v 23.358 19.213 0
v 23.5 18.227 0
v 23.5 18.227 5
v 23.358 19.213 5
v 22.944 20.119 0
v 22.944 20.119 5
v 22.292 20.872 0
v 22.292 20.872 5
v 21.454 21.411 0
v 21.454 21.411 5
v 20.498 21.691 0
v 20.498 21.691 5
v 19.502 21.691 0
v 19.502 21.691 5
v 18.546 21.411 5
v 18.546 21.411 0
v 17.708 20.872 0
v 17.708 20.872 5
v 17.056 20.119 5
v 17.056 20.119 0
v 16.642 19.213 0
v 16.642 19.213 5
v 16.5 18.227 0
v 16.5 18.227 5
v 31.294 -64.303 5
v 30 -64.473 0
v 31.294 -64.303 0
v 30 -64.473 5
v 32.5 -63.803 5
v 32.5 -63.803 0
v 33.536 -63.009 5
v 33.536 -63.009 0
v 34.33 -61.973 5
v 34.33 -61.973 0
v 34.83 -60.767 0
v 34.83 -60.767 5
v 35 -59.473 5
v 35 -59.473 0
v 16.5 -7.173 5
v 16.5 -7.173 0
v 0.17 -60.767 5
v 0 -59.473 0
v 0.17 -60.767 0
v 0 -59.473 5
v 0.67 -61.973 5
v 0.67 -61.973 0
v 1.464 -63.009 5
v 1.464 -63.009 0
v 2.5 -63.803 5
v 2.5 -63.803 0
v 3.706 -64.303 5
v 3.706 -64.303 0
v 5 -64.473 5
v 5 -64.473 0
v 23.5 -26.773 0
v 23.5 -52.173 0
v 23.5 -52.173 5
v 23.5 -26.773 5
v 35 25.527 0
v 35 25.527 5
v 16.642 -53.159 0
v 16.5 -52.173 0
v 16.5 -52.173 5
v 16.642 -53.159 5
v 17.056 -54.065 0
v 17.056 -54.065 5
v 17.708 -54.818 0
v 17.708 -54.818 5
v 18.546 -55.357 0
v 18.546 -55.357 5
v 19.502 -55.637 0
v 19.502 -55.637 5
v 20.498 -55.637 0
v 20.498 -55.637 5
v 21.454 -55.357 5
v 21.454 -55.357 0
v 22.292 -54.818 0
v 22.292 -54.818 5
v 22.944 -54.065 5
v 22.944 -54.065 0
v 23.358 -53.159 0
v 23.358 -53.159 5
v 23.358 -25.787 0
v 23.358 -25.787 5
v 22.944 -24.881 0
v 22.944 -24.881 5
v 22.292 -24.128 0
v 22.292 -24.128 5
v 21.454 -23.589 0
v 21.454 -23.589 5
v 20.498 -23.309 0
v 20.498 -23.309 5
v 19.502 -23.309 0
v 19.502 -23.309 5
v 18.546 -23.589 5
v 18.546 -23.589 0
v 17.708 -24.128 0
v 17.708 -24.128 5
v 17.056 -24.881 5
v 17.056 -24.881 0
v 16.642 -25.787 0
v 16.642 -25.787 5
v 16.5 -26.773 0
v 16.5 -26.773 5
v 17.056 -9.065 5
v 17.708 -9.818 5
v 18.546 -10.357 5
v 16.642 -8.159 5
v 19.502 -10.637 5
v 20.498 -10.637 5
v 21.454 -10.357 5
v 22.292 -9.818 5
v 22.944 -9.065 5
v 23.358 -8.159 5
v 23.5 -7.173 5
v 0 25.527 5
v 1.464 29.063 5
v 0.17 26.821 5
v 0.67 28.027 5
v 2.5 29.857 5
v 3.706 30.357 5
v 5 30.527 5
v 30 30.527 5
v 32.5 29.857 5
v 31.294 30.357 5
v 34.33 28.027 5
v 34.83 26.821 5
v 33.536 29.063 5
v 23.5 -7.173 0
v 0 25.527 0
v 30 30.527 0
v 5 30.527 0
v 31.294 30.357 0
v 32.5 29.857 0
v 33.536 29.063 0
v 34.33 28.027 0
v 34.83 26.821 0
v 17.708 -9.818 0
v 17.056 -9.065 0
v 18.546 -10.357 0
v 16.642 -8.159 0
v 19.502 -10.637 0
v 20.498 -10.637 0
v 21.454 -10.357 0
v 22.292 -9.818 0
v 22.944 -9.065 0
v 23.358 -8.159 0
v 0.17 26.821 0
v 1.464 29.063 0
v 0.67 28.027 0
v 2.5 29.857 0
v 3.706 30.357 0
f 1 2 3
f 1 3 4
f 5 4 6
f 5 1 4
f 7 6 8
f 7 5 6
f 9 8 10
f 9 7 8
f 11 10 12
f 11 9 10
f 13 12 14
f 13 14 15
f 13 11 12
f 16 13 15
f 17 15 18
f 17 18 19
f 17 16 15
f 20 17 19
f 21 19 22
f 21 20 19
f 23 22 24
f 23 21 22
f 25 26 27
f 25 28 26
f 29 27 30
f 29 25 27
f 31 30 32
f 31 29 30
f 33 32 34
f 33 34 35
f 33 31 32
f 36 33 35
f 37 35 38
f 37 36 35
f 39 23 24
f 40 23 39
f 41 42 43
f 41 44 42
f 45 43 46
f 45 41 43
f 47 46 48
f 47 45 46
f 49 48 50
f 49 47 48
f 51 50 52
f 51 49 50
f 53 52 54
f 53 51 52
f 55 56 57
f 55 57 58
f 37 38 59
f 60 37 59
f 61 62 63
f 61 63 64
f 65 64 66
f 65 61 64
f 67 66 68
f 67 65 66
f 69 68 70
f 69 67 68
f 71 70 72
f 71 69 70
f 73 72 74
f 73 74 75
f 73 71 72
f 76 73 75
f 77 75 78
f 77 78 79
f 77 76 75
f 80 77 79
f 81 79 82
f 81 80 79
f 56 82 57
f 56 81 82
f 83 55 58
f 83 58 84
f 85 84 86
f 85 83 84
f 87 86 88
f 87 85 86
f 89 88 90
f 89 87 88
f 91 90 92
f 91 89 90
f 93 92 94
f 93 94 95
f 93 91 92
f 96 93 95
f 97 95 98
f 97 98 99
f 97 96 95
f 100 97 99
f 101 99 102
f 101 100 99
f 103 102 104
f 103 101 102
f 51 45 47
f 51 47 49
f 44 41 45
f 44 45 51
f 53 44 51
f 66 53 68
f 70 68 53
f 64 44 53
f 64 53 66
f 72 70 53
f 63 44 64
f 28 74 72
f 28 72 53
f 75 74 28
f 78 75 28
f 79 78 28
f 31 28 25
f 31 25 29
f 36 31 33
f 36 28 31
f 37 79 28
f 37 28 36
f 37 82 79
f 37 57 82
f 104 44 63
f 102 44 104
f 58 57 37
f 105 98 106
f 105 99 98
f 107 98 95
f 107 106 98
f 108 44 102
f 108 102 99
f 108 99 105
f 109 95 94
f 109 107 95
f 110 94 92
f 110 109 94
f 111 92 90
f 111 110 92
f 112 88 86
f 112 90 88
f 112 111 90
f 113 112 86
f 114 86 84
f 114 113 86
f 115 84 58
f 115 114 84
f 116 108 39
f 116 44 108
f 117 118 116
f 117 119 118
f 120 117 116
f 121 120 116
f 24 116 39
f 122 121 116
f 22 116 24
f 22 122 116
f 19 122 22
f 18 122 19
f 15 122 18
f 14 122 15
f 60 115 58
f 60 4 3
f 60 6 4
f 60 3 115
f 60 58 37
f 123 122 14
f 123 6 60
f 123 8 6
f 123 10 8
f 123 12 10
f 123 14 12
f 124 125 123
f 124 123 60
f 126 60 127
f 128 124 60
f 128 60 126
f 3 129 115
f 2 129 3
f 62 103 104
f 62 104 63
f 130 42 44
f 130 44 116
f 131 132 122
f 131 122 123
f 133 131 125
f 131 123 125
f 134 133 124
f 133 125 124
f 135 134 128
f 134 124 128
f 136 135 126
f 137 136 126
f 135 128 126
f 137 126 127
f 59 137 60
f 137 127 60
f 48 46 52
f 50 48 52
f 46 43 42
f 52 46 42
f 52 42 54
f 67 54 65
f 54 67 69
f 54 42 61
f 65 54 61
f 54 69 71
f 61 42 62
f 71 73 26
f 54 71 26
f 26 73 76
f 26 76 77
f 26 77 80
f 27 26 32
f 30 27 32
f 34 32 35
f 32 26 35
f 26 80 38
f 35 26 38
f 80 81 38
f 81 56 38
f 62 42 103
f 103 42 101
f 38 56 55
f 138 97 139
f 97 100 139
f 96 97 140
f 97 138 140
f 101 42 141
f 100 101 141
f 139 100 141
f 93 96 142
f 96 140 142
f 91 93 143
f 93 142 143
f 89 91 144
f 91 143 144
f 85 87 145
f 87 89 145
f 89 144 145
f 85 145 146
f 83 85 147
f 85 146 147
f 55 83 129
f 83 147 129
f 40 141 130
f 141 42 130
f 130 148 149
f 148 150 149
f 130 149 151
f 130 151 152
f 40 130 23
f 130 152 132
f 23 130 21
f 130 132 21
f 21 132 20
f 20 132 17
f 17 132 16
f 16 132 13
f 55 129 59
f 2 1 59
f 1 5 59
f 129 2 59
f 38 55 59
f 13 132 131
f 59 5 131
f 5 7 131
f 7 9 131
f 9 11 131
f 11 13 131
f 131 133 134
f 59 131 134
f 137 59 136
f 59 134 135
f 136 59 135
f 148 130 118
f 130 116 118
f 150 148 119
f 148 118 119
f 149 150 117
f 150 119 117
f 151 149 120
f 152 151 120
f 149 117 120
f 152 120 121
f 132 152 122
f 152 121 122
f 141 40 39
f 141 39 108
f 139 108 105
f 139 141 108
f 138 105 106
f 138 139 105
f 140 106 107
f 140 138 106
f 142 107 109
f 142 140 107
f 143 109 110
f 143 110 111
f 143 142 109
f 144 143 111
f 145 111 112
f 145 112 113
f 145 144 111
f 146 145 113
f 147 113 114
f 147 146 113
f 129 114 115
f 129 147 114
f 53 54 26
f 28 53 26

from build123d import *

# Parameters (mm, degrees)
SKETCH1_W           = 35
SKETCH1_H           = 95
BOSS_EXTRUDE1_DEPTH = 5
FILLET1_R           = 5


with BuildPart() as part:
    # Sketch1 → Boss-Extrude1 (new body)
    with BuildSketch(Plane.XY):
        with Locations((17.5, -16.973)):
            Rectangle(SKETCH1_W, SKETCH1_H)
        with BuildLine():
            ThreePointArc((16.5, -7.173), (20, -10.673), (23.5, -7.173))
            Line((23.5, -7.173), (23.5, 18.227))
            ThreePointArc((23.5, 18.227), (20, 21.727), (16.5, 18.227))
            Line((16.5, 18.227), (16.5, -7.173))
        make_face(mode=Mode.SUBTRACT)
        with BuildLine():
            ThreePointArc((23.5, -26.773), (20, -23.273), (16.5, -26.773))
            Line((16.5, -26.773), (16.5, -52.173))
            ThreePointArc((16.5, -52.173), (20, -55.673), (23.5, -52.173))
            Line((23.5, -52.173), (23.5, -26.773))
        make_face(mode=Mode.SUBTRACT)
    extrude(amount=BOSS_EXTRUDE1_DEPTH)

    # Fillet1
    fillet1_edges = [part.edges().sort_by_distance(p)[0] for p in [
        (0, -64.473, 2.5),
        (0, 30.527, 2.5),
        (35, 30.527, 2.5),
        (35, -64.473, 2.5),
    ]]
    fillet(fillet1_edges, radius=FILLET1_R)


solid = part.part
